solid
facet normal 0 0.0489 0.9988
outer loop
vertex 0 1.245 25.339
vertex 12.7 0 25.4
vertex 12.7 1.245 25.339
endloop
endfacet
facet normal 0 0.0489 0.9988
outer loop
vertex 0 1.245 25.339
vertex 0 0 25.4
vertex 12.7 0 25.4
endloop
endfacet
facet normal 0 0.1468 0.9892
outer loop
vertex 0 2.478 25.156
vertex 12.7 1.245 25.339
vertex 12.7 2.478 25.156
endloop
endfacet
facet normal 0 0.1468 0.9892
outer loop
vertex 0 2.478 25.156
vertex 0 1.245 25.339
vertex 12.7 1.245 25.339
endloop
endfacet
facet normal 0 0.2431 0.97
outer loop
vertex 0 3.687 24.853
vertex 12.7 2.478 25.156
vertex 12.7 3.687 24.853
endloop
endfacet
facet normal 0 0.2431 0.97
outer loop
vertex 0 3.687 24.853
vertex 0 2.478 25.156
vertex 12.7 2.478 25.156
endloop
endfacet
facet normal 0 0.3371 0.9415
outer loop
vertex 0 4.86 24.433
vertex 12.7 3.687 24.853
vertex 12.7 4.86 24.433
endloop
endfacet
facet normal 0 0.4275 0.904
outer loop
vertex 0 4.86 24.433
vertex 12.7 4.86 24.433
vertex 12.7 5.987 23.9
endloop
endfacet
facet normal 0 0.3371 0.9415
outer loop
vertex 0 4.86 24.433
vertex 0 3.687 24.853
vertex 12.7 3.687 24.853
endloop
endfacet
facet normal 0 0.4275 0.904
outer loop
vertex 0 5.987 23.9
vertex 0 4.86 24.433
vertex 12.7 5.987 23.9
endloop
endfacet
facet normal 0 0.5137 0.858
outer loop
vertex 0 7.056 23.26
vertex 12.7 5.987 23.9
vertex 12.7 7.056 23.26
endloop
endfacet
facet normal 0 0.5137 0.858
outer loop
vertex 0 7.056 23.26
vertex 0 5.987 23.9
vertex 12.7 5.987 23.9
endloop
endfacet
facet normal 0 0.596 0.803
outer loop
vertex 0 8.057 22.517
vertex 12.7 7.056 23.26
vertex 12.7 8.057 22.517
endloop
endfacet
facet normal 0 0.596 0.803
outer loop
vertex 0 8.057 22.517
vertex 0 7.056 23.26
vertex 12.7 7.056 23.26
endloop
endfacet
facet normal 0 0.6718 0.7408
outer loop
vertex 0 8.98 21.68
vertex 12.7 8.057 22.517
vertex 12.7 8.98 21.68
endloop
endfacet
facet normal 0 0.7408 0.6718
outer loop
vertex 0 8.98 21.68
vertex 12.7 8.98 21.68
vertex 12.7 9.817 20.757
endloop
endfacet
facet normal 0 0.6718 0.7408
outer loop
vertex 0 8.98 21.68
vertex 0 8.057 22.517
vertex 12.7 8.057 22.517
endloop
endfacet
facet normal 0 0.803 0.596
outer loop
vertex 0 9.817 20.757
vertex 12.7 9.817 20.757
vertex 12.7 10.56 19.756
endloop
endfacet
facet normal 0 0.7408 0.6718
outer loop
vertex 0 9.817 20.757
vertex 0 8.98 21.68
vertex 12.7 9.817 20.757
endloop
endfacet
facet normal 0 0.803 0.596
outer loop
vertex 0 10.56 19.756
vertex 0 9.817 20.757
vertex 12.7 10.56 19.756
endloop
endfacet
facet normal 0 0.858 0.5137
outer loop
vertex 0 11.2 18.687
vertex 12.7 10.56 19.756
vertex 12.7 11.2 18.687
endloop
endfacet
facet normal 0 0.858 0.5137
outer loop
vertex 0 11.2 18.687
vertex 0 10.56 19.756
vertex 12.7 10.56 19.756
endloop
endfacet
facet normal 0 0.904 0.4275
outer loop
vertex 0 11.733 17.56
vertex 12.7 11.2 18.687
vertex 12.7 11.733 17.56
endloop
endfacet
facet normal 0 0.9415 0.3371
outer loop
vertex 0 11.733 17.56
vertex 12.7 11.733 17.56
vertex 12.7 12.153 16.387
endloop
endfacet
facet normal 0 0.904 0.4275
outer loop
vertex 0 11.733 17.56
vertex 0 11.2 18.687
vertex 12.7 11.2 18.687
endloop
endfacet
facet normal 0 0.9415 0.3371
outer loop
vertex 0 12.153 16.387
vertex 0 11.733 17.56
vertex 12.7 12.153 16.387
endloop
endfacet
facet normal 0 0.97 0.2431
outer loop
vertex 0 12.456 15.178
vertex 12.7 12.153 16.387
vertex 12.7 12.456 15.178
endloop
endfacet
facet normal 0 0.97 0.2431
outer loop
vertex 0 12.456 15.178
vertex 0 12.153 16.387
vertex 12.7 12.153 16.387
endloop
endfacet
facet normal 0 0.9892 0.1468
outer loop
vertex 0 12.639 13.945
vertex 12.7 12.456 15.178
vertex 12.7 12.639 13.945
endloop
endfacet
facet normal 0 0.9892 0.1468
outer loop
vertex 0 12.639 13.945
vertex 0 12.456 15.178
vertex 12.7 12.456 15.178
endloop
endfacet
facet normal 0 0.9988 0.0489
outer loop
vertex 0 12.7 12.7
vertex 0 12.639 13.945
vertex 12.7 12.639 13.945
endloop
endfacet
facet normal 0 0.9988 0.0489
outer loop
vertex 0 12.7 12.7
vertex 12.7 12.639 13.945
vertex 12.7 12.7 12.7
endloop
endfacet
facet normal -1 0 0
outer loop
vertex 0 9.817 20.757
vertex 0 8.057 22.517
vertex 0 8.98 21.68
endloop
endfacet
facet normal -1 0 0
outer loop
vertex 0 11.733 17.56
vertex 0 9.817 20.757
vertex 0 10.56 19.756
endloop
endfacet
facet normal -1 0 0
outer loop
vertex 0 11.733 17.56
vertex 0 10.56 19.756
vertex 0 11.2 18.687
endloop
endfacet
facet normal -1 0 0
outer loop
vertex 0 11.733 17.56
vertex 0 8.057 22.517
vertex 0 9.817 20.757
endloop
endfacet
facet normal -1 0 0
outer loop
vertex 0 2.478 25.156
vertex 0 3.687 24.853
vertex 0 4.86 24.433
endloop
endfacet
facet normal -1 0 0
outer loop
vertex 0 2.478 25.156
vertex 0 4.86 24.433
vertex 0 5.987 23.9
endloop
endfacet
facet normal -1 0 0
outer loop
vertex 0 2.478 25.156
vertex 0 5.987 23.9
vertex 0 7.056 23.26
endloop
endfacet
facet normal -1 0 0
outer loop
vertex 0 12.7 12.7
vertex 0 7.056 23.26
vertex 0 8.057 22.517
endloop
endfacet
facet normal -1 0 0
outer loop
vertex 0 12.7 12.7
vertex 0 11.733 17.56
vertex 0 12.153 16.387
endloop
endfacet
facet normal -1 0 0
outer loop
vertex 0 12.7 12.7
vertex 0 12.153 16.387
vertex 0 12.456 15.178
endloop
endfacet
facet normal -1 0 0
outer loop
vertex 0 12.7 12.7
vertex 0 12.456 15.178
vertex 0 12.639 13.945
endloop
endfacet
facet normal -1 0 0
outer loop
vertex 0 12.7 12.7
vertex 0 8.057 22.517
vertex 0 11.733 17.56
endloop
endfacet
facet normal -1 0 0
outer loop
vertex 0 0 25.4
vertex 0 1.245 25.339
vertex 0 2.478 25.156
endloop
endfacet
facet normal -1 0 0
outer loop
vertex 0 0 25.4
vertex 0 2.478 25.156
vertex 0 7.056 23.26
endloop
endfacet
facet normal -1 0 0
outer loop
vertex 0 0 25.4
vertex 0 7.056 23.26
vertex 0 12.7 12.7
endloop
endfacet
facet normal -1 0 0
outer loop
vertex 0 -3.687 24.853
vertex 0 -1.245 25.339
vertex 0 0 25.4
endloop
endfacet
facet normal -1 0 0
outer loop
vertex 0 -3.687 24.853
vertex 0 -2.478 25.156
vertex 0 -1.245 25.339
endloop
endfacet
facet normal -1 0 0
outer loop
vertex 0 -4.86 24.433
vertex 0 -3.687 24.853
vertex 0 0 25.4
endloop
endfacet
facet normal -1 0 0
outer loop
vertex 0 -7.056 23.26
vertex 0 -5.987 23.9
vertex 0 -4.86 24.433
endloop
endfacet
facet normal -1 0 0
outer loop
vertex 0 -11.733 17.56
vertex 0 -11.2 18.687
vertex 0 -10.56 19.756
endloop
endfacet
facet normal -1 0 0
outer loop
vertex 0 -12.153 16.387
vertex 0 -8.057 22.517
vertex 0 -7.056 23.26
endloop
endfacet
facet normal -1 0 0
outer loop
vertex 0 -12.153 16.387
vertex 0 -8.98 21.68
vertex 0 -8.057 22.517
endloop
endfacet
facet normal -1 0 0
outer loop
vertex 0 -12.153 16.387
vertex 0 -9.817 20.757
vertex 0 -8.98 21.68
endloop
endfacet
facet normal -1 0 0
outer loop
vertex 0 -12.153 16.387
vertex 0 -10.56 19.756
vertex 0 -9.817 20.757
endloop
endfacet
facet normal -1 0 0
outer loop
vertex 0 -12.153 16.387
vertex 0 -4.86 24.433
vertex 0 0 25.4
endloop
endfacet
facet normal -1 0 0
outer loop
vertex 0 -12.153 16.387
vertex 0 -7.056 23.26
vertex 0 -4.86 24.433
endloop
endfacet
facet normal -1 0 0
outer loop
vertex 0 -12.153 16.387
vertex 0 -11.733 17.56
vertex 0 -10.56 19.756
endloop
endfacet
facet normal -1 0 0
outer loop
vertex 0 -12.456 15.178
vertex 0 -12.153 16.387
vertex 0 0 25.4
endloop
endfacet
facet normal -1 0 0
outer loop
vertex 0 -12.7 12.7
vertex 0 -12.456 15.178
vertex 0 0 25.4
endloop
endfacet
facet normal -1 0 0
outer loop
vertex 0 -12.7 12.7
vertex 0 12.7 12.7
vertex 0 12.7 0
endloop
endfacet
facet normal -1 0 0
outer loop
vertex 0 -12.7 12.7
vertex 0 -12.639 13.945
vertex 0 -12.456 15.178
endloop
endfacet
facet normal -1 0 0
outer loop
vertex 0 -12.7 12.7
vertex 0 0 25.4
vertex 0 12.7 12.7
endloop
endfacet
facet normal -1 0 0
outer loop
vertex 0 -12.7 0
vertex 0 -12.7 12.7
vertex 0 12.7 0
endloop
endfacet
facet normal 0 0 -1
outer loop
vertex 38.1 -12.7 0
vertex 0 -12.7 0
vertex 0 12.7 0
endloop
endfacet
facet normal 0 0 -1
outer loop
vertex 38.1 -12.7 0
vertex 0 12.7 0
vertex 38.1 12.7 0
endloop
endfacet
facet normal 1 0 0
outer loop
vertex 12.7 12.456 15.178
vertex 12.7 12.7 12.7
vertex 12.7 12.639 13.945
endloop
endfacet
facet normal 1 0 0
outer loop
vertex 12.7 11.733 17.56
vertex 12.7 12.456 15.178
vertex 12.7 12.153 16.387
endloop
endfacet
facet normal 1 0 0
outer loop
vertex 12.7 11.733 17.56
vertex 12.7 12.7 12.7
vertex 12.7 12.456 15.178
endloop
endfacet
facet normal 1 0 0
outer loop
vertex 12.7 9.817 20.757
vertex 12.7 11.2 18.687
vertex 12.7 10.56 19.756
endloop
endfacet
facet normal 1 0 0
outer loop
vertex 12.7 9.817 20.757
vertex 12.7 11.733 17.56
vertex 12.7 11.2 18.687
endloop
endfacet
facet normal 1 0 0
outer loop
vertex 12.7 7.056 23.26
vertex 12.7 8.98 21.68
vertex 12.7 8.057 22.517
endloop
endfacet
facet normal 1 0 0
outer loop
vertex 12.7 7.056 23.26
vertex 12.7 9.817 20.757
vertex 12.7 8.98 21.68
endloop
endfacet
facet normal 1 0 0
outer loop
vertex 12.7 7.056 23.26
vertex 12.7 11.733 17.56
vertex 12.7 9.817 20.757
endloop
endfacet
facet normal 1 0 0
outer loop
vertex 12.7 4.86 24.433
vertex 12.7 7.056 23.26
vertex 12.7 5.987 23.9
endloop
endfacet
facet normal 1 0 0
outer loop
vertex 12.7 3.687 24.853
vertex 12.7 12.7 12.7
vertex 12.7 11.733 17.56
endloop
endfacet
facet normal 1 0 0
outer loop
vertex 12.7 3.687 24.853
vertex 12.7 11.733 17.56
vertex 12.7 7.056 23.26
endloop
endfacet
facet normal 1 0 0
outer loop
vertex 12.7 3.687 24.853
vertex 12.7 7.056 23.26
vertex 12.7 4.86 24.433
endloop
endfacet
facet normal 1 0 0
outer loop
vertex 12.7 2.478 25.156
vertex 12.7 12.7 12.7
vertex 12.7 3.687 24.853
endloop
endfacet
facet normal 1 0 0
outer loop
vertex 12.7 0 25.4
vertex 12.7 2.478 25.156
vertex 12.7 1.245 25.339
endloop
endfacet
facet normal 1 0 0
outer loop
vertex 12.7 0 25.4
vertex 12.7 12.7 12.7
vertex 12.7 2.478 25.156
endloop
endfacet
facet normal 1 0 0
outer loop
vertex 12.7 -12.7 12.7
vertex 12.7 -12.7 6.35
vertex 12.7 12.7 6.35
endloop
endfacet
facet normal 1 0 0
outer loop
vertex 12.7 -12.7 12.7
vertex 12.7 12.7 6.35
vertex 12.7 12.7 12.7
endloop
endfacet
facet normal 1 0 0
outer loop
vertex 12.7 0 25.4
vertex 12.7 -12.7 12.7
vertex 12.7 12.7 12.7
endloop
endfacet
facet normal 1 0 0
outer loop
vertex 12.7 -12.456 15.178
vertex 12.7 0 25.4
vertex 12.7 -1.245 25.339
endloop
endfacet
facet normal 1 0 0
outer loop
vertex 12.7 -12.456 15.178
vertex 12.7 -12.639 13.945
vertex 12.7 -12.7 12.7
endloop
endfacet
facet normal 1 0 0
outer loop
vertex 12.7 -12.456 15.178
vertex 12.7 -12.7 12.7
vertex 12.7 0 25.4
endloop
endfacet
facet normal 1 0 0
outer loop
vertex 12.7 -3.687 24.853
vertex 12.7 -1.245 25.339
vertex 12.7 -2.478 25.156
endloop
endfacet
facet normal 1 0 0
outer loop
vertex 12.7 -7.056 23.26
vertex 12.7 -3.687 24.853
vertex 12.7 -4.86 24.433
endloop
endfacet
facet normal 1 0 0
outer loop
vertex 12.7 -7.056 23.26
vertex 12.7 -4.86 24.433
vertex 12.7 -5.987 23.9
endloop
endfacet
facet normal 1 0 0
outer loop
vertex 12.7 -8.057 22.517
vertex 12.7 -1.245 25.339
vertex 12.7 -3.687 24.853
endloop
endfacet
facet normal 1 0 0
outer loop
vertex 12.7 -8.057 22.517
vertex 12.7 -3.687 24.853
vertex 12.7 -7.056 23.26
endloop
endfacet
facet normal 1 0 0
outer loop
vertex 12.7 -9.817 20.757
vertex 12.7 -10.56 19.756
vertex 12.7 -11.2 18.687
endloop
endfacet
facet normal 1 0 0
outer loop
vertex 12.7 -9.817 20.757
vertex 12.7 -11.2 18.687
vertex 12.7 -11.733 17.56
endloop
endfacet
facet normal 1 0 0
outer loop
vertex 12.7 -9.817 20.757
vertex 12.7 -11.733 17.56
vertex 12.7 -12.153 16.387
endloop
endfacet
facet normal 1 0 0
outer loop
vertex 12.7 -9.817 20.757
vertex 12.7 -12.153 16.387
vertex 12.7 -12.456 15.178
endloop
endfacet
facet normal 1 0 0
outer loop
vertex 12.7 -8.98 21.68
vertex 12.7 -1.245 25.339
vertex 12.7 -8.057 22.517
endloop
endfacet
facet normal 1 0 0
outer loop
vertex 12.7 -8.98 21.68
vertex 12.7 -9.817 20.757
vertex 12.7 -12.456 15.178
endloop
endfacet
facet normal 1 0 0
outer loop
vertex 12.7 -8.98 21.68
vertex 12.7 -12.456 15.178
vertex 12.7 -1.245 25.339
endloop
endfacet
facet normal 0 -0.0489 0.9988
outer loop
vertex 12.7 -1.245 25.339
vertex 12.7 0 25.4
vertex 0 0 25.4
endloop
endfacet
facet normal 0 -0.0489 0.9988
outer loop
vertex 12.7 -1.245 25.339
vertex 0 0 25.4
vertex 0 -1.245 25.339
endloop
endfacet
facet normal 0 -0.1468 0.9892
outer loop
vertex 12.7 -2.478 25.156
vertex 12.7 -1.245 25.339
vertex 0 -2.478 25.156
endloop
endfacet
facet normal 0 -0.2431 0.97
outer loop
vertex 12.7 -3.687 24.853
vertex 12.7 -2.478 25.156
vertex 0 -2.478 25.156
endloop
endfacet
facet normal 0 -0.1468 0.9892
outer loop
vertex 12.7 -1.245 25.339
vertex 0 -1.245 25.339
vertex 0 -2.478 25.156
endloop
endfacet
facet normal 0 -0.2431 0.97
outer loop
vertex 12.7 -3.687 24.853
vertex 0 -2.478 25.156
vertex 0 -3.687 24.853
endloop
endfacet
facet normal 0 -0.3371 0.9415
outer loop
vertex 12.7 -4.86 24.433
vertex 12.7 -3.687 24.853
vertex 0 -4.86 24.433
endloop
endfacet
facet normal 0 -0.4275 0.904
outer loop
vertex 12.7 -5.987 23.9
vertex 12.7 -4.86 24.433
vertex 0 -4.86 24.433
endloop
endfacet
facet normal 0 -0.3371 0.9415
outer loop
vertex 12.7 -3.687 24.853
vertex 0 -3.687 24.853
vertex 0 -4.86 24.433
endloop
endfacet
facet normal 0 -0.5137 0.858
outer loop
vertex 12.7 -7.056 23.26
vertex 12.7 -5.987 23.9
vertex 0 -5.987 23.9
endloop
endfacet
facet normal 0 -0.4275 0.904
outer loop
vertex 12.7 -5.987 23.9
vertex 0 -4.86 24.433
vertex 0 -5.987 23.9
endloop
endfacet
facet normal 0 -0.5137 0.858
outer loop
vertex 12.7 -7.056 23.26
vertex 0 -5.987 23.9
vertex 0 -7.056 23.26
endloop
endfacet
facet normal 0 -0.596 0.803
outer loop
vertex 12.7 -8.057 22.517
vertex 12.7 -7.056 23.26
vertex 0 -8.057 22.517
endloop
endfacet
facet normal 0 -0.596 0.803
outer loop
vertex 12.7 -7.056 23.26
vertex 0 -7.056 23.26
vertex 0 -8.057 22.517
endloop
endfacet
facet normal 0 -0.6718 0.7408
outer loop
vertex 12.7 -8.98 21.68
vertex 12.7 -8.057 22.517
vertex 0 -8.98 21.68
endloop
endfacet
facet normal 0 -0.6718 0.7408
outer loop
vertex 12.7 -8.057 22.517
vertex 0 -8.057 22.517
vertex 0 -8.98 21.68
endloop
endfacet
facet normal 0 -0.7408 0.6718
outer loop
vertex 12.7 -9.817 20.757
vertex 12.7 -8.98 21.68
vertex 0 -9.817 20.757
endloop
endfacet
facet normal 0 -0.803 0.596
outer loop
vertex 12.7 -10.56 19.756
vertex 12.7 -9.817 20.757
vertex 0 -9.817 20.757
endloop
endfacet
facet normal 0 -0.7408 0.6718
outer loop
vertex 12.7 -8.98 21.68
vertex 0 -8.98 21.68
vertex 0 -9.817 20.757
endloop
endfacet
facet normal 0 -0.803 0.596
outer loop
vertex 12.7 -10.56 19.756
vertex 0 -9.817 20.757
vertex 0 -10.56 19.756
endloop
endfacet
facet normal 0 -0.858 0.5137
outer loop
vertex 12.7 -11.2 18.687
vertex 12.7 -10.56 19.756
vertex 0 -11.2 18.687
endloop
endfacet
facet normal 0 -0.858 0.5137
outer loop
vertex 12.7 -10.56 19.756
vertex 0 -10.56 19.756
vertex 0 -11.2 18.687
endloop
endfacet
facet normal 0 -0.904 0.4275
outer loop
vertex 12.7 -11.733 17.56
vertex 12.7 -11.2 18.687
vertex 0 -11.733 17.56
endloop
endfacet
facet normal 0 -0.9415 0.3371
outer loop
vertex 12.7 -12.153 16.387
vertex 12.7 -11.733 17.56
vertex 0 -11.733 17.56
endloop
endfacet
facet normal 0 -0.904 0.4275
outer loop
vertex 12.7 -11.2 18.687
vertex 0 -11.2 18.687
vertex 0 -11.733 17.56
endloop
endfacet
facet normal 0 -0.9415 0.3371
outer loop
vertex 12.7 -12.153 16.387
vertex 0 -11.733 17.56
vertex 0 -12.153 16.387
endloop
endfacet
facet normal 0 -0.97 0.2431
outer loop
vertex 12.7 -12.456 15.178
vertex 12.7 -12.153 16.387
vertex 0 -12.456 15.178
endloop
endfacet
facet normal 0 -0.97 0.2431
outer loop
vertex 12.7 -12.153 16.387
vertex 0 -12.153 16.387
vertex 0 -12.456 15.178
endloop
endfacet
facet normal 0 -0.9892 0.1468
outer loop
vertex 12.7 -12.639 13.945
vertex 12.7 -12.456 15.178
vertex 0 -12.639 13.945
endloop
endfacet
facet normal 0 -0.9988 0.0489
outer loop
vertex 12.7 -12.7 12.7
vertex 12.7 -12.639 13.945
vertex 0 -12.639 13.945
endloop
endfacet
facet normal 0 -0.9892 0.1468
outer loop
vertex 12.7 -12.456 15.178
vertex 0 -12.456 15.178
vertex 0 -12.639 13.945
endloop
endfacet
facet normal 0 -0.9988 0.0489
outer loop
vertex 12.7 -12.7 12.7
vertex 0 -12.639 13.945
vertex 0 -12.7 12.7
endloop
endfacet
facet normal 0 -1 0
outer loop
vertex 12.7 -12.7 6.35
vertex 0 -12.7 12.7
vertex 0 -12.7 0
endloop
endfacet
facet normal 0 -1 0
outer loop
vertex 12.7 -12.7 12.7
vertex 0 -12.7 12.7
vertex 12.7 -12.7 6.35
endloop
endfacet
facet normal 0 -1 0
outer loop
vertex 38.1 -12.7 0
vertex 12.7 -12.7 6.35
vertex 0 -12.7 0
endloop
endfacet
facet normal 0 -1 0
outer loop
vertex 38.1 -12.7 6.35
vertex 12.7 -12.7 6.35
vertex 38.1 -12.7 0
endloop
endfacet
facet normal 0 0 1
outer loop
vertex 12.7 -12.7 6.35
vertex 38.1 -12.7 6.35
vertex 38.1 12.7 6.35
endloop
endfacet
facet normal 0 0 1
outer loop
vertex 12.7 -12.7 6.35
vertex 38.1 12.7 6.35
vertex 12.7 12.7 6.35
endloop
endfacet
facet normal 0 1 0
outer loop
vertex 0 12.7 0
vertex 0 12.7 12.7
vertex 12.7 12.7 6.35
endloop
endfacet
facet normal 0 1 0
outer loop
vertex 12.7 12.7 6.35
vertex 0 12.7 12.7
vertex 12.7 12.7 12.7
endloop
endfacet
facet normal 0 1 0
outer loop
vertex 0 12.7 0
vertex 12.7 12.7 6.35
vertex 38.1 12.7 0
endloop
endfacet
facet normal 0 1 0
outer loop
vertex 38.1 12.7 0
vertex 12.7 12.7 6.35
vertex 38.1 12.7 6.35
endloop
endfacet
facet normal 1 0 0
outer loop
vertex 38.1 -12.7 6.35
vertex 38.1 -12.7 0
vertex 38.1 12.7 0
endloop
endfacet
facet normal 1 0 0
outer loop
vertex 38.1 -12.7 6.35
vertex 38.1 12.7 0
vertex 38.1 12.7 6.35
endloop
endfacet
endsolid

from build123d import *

# Parameters (mm, degrees)
F1_DEPTH = 12.7
F2_R     = 12.7
F3_R     = 12.69999


# Not quite as in the source:
# - a fillet or chamfer is up to 0.001 mm smaller than in the source, because OpenCascade refuses the exact size


with BuildPart() as f1:
    # F0 (on Front) → F1 (new body, symmetric)
    with BuildSketch(Plane.XZ):
        Polygon((0, 25.4), (0, 0), (38.1, 0), (38.1, 6.35), (12.7, 6.35), (12.7, 25.4), align=None)
    extrude(amount=F1_DEPTH, both=True)

    # F2
    f2_edges = [f1.edges().sort_by_distance(p)[0] for p in [
        (6.35, -12.7, 25.4),
    ]]
    fillet(f2_edges, radius=F2_R)

    # F3 (radius 12.7 in the source; OpenCascade refuses exactly that, so slightly less here)
    f3_edges = [f1.edges().sort_by_distance(p)[0] for p in [
        (6.35, 12.7, 25.4),
    ]]
    fillet(f3_edges, radius=F3_R)


solid = f1.part
